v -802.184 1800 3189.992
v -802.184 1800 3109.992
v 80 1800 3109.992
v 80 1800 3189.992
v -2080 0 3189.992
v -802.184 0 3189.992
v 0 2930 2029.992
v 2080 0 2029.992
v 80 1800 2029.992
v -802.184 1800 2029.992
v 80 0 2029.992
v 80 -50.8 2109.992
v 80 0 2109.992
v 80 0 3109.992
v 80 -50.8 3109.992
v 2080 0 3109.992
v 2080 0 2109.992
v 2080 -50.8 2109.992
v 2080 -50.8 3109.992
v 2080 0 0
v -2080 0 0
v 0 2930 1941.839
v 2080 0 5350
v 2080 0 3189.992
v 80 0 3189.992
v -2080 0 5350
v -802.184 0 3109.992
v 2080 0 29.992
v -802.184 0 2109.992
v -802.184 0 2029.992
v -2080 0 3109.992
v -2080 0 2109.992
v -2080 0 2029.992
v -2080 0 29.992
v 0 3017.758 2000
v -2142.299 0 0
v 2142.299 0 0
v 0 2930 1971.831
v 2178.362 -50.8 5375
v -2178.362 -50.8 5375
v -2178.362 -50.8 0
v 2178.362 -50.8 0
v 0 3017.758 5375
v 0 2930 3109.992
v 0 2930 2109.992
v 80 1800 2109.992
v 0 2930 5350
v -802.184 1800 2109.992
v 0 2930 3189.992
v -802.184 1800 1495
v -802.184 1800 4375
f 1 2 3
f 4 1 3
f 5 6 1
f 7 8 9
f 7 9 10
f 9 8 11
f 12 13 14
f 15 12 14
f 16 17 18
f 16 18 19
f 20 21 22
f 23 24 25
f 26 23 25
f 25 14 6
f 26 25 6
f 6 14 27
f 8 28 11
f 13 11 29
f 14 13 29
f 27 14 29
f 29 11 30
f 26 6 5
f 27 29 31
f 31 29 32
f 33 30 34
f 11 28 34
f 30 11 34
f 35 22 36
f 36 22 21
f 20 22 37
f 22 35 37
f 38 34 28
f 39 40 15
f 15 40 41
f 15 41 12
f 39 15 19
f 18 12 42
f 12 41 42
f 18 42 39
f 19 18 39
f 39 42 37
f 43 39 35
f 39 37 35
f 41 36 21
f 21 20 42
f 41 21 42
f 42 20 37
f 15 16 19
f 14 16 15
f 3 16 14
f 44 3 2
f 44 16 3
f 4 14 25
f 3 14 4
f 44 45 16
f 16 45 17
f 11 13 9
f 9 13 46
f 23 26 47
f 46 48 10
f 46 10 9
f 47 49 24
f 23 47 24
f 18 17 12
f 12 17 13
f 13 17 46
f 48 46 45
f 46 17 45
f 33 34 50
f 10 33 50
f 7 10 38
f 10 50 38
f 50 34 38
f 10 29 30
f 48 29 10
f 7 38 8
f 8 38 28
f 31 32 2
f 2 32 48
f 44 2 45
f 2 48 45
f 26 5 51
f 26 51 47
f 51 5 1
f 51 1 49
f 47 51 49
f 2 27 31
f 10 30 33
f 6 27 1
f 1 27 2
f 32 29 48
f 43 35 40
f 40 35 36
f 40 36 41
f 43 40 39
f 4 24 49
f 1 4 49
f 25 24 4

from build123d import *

# Parameters (mm, degrees)
F1_DEPTH       = 5350
F3_DEPTH       = 2500
F5_DEPTH       = 25
F7_DEPTH       = 25
F10_W          = 4160
F10_H          = 80
F12_W          = 882.1843003413
F12_H          = 1800
F13_DEPTH      = 880
F13_DEPTH_BACK = 2000
F14_W          = 2000
F14_H          = 1000
F15_DEPTH      = 50.8


with BuildPart() as f1:
    # F0 (on Top) → F1 (new body)
    with BuildSketch(Plane.XY):
        Polygon((0, 3017.7577264632), (-2178.361798991, -50.8), (0, -50.8), (2178.361798991, -50.8), align=None)
        Polygon((2080, 0), (0, 0), (-2080, 0), (0, 2930), align=None, mode=Mode.SUBTRACT)
    extrude(amount=F1_DEPTH)

    # F2 (on Right) → F3 (cut, symmetric)
    with BuildSketch(Plane.YZ):
        Polygon((3017.7577264632, 2000), (0, 0), (3017.7577264632, 0), align=None)
    extrude(amount=F3_DEPTH, both=True, mode=Mode.SUBTRACT)

    # F4 (on face) → F5 (join)
    with BuildSketch(Plane(origin=(0, 0, 0), x_dir=(1, 0, 0), z_dir=(0, 0.5524343022, -0.8335564419))):
        Polygon((-2142.2990003561, 0), (0, -3620.3399972418), (2142.2990003561, 0), align=None)
    extrude(amount=-F5_DEPTH)

    # F6 (on face) → F7 (join)
    with BuildSketch(Plane.XY.offset(5350)):
        Polygon((2178.361798991, -50.8), (0, 3017.7577264632), (-2178.361798991, -50.8), align=None)
    extrude(amount=F7_DEPTH)

    # F10 (on face) → F11 (join, up to the next surface of F1)
    with BuildSketch(Plane(origin=(0, 0, 0), x_dir=(-1, 0, 0), z_dir=(0, 1, 0))):
        with Locations((0, 3149.9919702425)):
            Rectangle(F10_W, F10_H)
        with Locations((0, 2069.9919702425)):
            Rectangle(F10_W, F10_H)
    extrude(until=Until.NEXT)

    # F12 (on offset) → F13 (cut, two sides)
    with BuildSketch(Plane.XY.offset(2375)) as f13_sk:
        with Locations((-361.0921501707, 900)):
            Rectangle(F12_W, F12_H)
    extrude(amount=-F13_DEPTH, mode=Mode.SUBTRACT)
    extrude(f13_sk.sketch, amount=F13_DEPTH_BACK, mode=Mode.SUBTRACT)

    # F14 (on face) → F15 (cut, through all)
    with BuildSketch(Plane(origin=(0, 0, 0), x_dir=(-1, 0, 0), z_dir=(0, 1, 0))):
        with Locations((-1080, 2609.9919702425)):
            Rectangle(F14_W, F14_H)
    extrude(amount=-F15_DEPTH, mode=Mode.SUBTRACT)


solid = f1.part
